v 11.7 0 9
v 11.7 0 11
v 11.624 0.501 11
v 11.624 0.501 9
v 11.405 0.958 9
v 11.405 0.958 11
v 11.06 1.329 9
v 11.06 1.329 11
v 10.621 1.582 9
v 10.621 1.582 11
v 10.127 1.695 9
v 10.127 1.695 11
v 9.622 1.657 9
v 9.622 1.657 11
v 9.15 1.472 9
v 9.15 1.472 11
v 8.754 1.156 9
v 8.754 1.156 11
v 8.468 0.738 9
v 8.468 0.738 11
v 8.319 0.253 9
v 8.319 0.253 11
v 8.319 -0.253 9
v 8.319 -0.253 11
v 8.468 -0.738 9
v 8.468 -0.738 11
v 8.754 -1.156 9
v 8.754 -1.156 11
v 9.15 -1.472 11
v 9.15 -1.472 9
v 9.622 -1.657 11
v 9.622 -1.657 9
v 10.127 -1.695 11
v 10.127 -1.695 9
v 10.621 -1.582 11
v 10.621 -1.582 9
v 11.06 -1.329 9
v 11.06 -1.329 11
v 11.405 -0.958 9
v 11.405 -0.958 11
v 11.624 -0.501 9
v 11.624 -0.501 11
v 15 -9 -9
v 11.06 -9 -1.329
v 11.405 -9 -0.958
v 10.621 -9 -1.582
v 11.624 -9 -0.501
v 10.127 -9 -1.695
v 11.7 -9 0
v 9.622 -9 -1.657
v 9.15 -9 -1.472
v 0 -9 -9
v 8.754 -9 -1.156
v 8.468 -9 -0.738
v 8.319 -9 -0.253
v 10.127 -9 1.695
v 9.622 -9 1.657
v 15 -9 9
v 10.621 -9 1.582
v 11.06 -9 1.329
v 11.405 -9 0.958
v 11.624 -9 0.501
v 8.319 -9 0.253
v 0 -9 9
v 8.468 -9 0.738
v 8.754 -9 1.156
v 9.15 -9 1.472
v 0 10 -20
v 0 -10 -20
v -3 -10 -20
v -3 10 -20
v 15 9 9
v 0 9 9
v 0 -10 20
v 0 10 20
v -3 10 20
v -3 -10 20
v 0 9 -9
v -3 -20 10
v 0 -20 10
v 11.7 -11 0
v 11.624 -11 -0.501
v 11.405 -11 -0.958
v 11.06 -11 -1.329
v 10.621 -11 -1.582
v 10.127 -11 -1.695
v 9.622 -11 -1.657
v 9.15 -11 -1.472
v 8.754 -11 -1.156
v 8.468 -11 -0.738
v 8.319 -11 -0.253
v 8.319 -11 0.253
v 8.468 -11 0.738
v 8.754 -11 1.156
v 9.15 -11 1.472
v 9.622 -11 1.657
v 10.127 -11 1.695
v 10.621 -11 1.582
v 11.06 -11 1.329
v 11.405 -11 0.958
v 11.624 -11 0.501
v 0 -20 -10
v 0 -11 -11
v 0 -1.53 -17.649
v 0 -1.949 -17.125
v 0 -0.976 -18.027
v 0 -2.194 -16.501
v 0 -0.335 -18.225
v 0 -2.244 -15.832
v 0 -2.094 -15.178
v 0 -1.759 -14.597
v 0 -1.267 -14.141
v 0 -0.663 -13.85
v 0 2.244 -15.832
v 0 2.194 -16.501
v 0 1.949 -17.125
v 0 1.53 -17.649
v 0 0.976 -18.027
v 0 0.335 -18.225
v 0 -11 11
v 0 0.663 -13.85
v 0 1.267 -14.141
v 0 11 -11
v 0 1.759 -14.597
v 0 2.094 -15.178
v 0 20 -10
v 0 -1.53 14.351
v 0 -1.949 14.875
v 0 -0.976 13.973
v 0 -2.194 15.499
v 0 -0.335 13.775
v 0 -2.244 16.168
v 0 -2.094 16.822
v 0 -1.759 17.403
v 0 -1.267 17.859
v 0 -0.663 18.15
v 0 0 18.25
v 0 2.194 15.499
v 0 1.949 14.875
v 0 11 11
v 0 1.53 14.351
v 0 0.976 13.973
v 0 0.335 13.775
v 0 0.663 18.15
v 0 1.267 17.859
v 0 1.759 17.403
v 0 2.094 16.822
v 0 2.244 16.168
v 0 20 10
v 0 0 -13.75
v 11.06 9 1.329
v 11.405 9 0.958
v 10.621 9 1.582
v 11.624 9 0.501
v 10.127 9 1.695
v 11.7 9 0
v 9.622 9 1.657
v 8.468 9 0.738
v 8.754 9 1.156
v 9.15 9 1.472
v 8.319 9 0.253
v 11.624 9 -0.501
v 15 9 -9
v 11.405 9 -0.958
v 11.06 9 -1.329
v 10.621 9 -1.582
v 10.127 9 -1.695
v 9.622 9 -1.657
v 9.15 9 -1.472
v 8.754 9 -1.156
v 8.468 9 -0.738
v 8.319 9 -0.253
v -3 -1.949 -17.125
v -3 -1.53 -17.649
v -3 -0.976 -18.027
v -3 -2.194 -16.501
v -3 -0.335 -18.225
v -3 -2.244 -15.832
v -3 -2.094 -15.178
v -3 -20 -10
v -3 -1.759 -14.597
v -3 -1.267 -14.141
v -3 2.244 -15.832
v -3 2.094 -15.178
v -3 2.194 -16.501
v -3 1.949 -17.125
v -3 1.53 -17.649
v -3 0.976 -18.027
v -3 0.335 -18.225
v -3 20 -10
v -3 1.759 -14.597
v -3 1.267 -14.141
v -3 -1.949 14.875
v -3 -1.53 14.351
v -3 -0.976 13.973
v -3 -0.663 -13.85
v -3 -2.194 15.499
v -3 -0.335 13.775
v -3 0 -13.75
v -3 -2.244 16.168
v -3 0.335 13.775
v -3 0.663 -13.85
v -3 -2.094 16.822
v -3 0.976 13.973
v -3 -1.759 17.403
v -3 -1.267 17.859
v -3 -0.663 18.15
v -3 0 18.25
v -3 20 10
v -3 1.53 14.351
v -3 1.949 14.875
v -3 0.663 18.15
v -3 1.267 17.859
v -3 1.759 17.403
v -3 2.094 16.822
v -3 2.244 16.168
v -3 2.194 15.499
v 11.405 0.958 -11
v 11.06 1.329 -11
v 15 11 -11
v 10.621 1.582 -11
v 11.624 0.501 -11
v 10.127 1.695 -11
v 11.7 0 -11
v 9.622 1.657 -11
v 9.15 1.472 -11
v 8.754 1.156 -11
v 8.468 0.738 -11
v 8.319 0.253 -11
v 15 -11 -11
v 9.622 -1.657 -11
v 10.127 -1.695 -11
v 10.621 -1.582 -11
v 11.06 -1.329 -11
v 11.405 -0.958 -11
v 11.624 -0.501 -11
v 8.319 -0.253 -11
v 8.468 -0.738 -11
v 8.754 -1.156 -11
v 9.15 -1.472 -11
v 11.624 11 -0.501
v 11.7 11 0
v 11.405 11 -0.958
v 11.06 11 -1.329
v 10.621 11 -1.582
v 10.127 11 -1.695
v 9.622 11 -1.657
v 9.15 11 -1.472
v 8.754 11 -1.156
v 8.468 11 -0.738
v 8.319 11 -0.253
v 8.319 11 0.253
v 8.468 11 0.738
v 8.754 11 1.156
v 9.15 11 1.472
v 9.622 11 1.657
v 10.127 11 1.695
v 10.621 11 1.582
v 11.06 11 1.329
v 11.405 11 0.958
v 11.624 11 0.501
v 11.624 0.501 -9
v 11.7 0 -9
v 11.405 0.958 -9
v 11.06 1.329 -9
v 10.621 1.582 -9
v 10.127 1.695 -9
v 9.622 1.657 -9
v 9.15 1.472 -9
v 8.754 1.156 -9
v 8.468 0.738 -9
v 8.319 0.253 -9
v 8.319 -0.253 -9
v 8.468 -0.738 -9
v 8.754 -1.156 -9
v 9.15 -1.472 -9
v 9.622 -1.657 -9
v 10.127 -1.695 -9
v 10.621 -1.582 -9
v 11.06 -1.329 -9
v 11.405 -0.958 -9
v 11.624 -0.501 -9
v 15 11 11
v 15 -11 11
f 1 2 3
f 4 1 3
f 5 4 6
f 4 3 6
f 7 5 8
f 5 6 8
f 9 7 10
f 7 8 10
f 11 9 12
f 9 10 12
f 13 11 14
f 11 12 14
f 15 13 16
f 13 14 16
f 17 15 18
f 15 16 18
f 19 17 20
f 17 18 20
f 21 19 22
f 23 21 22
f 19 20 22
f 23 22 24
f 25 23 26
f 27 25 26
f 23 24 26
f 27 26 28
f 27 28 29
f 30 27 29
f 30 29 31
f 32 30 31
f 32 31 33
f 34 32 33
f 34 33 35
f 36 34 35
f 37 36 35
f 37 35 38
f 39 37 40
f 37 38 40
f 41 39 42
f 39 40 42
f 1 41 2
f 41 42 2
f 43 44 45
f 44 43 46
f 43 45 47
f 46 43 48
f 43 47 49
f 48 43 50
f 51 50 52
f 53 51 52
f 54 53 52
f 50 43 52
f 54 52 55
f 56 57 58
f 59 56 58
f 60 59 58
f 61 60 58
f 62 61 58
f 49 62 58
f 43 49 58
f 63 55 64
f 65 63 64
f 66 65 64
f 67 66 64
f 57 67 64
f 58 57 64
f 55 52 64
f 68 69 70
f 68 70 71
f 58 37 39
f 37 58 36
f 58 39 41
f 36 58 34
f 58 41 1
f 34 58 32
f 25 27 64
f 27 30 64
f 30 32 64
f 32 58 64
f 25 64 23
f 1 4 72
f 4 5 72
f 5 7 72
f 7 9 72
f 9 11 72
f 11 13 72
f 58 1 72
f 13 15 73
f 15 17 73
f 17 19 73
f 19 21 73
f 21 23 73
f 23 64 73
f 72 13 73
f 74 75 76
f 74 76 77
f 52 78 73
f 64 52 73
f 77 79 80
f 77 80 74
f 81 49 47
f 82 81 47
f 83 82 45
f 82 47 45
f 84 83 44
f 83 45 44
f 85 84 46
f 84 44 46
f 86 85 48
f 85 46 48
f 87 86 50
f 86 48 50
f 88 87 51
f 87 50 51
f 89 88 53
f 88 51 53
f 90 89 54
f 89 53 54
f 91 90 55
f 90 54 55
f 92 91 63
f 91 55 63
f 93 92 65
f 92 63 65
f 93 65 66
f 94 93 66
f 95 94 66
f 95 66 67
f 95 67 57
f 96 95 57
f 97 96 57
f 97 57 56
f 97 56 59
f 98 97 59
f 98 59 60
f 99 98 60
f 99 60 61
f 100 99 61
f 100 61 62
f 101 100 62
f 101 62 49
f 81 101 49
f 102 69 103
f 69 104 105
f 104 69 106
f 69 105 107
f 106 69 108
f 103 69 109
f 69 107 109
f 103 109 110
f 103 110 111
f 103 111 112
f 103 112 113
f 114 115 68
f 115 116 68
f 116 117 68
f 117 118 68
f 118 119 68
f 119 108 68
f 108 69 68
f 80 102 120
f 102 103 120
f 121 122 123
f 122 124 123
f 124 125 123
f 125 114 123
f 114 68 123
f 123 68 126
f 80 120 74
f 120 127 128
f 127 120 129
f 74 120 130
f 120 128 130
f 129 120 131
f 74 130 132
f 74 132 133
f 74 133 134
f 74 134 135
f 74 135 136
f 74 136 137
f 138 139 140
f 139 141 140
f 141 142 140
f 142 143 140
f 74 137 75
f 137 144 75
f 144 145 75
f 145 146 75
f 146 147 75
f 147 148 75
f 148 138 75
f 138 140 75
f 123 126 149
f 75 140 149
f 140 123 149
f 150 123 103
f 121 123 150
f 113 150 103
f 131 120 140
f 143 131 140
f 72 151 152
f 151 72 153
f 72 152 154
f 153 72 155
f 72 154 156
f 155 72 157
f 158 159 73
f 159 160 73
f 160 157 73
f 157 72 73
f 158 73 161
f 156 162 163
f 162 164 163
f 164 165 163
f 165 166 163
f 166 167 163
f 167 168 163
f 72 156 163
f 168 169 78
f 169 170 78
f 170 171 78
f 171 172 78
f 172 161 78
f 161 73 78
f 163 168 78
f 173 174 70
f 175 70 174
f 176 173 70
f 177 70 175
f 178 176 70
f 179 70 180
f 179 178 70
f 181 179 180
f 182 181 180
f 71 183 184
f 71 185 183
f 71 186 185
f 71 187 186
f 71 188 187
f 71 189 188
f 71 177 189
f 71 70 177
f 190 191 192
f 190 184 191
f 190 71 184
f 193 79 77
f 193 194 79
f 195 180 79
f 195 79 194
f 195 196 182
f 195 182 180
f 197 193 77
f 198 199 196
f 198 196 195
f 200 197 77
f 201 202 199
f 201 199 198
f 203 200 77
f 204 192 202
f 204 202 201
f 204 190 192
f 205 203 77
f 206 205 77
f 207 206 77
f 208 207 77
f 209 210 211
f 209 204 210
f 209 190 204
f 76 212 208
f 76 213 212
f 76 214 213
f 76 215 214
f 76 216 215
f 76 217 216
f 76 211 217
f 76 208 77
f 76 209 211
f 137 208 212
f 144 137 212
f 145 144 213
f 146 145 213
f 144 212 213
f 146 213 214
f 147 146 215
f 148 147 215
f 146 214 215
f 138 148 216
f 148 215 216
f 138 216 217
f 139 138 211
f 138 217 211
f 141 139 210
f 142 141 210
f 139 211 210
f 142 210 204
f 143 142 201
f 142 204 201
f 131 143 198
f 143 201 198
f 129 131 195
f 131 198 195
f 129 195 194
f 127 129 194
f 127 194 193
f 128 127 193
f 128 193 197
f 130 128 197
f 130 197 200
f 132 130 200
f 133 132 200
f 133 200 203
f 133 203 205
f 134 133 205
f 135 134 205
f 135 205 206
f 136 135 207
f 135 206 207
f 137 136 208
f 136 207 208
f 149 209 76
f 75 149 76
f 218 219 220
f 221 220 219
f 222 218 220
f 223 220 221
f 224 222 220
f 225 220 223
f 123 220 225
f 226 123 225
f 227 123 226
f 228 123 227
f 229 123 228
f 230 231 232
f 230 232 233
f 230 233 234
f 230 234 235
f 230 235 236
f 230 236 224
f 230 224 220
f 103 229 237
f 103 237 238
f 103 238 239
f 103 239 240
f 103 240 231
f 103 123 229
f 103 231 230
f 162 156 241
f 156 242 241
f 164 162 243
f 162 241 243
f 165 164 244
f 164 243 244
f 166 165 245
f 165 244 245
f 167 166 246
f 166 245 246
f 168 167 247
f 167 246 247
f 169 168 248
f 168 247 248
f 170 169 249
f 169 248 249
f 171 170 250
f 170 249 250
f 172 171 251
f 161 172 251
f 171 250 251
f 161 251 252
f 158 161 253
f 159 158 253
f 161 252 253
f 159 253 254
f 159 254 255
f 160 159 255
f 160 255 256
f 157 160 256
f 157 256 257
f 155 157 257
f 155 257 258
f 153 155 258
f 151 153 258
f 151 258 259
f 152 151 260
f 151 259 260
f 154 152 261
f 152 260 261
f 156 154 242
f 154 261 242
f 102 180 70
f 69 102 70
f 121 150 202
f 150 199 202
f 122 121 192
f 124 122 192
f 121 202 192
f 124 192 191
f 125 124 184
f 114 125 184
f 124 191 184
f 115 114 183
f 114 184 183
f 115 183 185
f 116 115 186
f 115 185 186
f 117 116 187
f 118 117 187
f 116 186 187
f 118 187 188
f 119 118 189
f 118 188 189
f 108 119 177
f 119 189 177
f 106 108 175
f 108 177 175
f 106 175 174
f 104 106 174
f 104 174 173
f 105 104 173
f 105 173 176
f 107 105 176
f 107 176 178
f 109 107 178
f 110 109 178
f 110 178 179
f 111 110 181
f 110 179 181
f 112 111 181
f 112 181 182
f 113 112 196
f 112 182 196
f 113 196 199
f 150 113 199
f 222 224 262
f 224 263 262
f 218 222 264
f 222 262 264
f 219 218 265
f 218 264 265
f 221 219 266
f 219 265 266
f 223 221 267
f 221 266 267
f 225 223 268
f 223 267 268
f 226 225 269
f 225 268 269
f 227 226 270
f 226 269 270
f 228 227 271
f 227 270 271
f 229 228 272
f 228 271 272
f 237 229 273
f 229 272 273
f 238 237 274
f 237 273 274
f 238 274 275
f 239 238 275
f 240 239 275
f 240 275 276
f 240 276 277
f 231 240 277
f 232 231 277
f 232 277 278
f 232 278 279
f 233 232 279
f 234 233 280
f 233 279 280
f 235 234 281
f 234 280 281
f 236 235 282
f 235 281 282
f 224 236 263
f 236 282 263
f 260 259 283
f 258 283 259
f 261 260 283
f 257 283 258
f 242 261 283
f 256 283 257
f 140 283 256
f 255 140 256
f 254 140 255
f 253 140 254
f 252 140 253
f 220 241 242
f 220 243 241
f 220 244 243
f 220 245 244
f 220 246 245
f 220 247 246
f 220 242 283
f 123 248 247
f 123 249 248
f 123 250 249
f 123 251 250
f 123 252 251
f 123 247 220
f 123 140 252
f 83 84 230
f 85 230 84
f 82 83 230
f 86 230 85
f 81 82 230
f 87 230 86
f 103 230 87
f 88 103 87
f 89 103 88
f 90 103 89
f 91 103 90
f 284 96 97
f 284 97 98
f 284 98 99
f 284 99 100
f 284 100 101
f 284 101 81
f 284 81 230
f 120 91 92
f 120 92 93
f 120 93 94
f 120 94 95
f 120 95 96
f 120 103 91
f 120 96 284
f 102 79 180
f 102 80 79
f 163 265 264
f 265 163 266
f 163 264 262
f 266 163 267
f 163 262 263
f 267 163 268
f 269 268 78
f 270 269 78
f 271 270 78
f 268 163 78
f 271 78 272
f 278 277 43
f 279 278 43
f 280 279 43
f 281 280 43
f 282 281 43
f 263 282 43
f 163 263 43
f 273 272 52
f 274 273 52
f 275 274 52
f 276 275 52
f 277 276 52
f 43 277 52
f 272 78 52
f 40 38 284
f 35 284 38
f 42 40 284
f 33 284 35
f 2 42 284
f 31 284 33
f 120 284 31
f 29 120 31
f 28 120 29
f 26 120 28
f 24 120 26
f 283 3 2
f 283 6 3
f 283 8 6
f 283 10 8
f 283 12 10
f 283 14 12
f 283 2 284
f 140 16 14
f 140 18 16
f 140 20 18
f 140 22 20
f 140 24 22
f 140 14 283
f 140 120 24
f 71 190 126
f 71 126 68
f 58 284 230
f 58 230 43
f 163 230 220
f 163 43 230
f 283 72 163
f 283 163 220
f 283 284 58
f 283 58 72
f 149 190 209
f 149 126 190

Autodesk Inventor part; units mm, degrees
ref_plane "YZ Plane" through (0, 0, 0) normal (1, 0, 0) x (0, 1, 0)
ref_plane "XZ Plane" through (0, 0, 0) normal (0, 1, 0) x (-1, 0, 0)
ref_plane "XY Plane" through (0, 0, 0) normal (0, 0, 1) x (1, 0, 0)
sketch "スケッチ1" plane through (0, 0, 0) normal (1, 0, 0) x (0, 1, 0)
  line L0 (9, -9) -> (-9, -9)
  line L1 (-9, -9) -> (-9, 9)
  line L2 (-9, 9) -> (9, 9)
  line L3 (9, 9) -> (9, -9)
  line L4 (9, -9) -> (-9, 9) construction
  line L5 (-9, -9) -> (9, 9) construction
  line L6 (11, -11) -> (-11, -11)
  line L7 (-11, -11) -> (-11, 11)
  line L8 (-11, 11) -> (11, 11)
  line L9 (11, 11) -> (11, -11)
  line L10 (11, -11) -> (-11, 11) construction
  line L11 (-11, -11) -> (11, 11) construction
  point P0 (0, 0)
  dimension "d0" = 18
  dimension "d1" = 18
  dimension "d2" = 22
  dimension "d3" = 22
extrude "押し出し1" add sketch "スケッチ1" along normal blind 15
sketch "スケッチ2" plane through (0, -11, 11) normal (0, 0, 1) x (1, 0, 0)
  circle A0 centre (10, 11) radius 1.7
  point P0 (0, 11)
  dimension "d6" = 3.4
extrude "押し出し2" cut sketch "スケッチ2" against normal blind 30
sketch "スケッチ3" plane through (0, 11, 11) normal (0, 1, 0) x (1, 0, 0)
  circle A0 centre (10, 11) radius 1.7
  point P0 (0, 11)
  dimension "d9" = 3.4
extrude "押し出し3" cut sketch "スケッチ3" against normal blind 30
sketch "スケッチ4" plane through (0, 0, 0) normal (-1, 0, 0) x (0, 0, 1)
  line L0 (20, -20) -> (-20, -20)
  line L1 (-20, -20) -> (-20, 20)
  line L2 (-20, 20) -> (20, 20)
  line L3 (20, 20) -> (20, -20)
  line L4 (20, -20) -> (-20, 20) construction
  line L5 (-20, -20) -> (20, 20) construction
  point P0 (0, 0)
  dimension "d12" = 40
  dimension "d13" = 40
extrude "押し出し4" add sketch "スケッチ4" along normal blind 3
sketch "スケッチ5" plane through (-3, 0, 0) normal (-1, 0, 0) x (0, 0, 1)
  circle A0 centre (16, 0) radius 2.25
  circle A1 centre (-16, 0) radius 2.25
  point P0 (0, 0)
  dimension "d16" = 4.5
  dimension "d17" = 4.5
extrude "押し出し5" cut sketch "スケッチ5" against normal blind 3
sketch "スケッチ6" plane through (-3, 0, 0) normal (-1, 0, 0) x (0, 0, 1)
  line L0 (20, 20) -> (-20, 20) projected
  line L1 (10, 20) -> (20, 10)
  line L2 (20, -20) -> (20, 20) projected
  line L3 (10, 20) -> (24.1421, 20) construction
  line L4 (20, 10) -> (20, 20)
  line L5 (20, 20) -> (10, 20)
  line L6 (-20, -20) -> (20, -20) projected
  line L7 (20, -20) -> (10, -20)
  line L8 (10, -20) -> (20, -10)
  line L9 (20, -10) -> (20, -20)
  line L10 (-20, 20) -> (-20, -20) projected
  line L11 (-20, -20) -> (-10, -20)
  line L12 (-10, -20) -> (-20, -10)
  line L13 (-20, -10) -> (-20, -20)
  line L14 (-20, 20) -> (-10, 20)
  line L15 (-10, 20) -> (-20, 10)
  line L16 (-20, 10) -> (-20, 20)
  point P0 (0, 0)
  dimension "d20" = 45
  dimension "d21" = 10
  dimension "d22" = 45
  dimension "d23" = 10
  dimension "d24" = 45
  dimension "d25" = 10
  dimension "d26" = 45
extrude "押し出し6" cut sketch "スケッチ6" against normal blind 3 contours L2 L1 L0 | L15 L10 L0 | L2 L6 L8 | L12 L6 L10
properties part number "square_ber_holder" material "ABS プラスチック"
